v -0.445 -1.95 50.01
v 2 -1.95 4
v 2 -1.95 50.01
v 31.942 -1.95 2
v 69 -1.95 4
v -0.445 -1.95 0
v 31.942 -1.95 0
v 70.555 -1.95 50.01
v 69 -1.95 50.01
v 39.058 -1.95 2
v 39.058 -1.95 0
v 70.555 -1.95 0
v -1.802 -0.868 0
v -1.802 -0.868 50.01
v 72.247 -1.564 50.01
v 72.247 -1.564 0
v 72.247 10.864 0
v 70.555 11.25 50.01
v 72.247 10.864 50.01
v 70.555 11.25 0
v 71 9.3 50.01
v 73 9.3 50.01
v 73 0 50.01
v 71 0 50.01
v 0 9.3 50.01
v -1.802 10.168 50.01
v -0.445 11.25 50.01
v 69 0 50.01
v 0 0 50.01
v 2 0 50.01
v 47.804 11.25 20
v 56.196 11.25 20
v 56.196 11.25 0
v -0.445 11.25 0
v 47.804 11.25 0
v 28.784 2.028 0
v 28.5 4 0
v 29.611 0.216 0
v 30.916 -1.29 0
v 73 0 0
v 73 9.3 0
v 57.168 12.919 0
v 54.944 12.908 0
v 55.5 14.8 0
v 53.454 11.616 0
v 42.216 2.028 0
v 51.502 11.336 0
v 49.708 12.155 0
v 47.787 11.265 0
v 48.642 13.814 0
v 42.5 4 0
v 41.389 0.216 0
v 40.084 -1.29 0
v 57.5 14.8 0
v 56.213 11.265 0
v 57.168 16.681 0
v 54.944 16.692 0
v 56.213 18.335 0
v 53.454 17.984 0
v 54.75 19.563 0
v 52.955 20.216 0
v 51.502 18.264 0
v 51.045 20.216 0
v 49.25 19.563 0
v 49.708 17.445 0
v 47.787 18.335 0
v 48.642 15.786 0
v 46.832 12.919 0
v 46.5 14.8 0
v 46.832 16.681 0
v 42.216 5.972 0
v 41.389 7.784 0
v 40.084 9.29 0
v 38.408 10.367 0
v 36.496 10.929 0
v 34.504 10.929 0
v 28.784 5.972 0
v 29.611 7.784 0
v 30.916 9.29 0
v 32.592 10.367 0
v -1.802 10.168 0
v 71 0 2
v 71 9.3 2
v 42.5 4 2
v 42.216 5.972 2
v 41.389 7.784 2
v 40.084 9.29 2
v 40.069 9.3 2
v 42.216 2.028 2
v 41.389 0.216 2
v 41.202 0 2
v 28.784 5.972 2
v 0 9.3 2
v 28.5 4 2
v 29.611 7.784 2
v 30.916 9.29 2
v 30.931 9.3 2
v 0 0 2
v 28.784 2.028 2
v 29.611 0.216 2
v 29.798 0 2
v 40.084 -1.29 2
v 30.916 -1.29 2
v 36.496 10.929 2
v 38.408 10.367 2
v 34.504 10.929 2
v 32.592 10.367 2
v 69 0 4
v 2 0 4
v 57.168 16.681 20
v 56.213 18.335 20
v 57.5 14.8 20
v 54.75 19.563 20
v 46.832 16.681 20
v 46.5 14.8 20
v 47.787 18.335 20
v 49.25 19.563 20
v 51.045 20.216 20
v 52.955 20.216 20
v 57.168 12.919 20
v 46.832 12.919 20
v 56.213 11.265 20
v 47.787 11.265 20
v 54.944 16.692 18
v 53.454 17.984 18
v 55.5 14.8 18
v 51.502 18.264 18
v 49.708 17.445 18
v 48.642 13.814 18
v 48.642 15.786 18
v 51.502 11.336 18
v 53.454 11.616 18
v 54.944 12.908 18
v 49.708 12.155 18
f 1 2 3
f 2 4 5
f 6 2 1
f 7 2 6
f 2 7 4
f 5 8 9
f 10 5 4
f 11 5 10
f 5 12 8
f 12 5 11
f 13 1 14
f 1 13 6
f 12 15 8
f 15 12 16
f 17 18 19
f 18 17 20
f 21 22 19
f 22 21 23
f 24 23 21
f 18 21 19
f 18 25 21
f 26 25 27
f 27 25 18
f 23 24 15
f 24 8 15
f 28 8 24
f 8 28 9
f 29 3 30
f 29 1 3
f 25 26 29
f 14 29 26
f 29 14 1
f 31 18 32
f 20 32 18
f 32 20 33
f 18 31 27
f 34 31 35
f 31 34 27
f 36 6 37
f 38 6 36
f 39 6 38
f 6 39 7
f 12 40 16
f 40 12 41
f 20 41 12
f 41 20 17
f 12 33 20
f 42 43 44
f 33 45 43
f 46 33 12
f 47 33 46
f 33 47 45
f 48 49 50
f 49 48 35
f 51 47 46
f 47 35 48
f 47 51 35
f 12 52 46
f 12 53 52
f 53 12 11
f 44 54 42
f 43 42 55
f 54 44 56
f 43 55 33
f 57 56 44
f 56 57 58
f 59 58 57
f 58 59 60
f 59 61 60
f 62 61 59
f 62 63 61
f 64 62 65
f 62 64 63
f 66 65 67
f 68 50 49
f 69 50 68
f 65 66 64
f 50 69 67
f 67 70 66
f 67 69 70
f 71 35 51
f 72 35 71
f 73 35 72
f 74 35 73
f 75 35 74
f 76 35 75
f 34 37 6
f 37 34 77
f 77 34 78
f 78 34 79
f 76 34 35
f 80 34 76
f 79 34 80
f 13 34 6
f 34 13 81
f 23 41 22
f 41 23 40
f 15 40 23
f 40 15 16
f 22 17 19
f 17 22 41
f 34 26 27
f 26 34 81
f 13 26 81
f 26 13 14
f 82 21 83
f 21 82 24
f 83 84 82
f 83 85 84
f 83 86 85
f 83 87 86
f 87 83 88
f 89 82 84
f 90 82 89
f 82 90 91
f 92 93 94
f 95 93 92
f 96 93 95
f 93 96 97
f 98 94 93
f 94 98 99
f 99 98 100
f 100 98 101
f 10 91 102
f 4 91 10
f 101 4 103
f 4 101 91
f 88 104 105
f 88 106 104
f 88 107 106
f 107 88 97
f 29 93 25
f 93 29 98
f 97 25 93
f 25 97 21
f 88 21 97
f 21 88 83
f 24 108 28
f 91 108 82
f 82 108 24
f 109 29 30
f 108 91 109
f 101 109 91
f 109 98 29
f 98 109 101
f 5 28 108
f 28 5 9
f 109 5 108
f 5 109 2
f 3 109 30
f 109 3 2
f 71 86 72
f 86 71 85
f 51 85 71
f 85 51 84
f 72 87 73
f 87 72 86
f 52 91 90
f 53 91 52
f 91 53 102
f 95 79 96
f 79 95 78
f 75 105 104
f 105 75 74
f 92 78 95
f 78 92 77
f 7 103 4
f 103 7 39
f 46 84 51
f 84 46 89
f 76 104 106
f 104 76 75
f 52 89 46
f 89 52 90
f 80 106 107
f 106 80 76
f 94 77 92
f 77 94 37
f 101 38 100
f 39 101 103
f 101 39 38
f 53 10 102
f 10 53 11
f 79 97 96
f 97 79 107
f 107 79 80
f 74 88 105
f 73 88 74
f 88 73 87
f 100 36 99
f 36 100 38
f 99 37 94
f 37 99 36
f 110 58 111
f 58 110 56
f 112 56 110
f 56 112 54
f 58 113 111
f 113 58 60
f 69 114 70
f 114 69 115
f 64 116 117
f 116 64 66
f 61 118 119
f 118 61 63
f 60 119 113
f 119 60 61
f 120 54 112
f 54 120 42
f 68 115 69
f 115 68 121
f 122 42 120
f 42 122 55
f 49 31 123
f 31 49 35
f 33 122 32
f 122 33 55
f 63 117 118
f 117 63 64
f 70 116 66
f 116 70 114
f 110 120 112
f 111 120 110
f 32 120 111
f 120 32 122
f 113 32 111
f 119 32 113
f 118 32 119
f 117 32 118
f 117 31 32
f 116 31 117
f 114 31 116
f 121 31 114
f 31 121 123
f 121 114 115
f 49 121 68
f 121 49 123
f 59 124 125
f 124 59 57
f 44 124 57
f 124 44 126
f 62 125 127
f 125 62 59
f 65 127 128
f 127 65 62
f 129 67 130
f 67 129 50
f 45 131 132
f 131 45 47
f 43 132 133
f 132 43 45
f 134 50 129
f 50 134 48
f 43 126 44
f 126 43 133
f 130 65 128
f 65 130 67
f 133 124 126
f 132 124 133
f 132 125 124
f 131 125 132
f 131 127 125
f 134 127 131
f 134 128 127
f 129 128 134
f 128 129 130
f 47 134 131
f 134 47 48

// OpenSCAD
phone_x = 71;
phone_y = 9.3;

height = 50;
grip = 2; // how much material protrudes in front of the phone to hold it in place

wall_thickness = 2;
stick_r = 3.5;
stick_height = 20;
camera_x = 52;
charger_y = 4;

module phone_void() {
	cube([phone_x, phone_y, height]);
}

module holder() {
	viewport_x = phone_x - (grip * 2);
	difference() {
		minkowski() {
			phone_void();
			cylinder(r=wall_thickness, h=0.01);
		}
		translate([0, 0, wall_thickness]) phone_void();
		translate([grip, -wall_thickness, wall_thickness + grip]) cube([viewport_x, wall_thickness, height]);
		translate([phone_x / 2, charger_y, 0]) {
			cylinder(r = 7, h = wall_thickness);
		}
	}
	translate([camera_x, stick_r + phone_y + wall_thickness, 0]) difference() {
		cylinder(r = stick_r + wall_thickness, h = stick_height);
		cylinder(r = stick_r, h = stick_height - wall_thickness);
	}
}

holder();
